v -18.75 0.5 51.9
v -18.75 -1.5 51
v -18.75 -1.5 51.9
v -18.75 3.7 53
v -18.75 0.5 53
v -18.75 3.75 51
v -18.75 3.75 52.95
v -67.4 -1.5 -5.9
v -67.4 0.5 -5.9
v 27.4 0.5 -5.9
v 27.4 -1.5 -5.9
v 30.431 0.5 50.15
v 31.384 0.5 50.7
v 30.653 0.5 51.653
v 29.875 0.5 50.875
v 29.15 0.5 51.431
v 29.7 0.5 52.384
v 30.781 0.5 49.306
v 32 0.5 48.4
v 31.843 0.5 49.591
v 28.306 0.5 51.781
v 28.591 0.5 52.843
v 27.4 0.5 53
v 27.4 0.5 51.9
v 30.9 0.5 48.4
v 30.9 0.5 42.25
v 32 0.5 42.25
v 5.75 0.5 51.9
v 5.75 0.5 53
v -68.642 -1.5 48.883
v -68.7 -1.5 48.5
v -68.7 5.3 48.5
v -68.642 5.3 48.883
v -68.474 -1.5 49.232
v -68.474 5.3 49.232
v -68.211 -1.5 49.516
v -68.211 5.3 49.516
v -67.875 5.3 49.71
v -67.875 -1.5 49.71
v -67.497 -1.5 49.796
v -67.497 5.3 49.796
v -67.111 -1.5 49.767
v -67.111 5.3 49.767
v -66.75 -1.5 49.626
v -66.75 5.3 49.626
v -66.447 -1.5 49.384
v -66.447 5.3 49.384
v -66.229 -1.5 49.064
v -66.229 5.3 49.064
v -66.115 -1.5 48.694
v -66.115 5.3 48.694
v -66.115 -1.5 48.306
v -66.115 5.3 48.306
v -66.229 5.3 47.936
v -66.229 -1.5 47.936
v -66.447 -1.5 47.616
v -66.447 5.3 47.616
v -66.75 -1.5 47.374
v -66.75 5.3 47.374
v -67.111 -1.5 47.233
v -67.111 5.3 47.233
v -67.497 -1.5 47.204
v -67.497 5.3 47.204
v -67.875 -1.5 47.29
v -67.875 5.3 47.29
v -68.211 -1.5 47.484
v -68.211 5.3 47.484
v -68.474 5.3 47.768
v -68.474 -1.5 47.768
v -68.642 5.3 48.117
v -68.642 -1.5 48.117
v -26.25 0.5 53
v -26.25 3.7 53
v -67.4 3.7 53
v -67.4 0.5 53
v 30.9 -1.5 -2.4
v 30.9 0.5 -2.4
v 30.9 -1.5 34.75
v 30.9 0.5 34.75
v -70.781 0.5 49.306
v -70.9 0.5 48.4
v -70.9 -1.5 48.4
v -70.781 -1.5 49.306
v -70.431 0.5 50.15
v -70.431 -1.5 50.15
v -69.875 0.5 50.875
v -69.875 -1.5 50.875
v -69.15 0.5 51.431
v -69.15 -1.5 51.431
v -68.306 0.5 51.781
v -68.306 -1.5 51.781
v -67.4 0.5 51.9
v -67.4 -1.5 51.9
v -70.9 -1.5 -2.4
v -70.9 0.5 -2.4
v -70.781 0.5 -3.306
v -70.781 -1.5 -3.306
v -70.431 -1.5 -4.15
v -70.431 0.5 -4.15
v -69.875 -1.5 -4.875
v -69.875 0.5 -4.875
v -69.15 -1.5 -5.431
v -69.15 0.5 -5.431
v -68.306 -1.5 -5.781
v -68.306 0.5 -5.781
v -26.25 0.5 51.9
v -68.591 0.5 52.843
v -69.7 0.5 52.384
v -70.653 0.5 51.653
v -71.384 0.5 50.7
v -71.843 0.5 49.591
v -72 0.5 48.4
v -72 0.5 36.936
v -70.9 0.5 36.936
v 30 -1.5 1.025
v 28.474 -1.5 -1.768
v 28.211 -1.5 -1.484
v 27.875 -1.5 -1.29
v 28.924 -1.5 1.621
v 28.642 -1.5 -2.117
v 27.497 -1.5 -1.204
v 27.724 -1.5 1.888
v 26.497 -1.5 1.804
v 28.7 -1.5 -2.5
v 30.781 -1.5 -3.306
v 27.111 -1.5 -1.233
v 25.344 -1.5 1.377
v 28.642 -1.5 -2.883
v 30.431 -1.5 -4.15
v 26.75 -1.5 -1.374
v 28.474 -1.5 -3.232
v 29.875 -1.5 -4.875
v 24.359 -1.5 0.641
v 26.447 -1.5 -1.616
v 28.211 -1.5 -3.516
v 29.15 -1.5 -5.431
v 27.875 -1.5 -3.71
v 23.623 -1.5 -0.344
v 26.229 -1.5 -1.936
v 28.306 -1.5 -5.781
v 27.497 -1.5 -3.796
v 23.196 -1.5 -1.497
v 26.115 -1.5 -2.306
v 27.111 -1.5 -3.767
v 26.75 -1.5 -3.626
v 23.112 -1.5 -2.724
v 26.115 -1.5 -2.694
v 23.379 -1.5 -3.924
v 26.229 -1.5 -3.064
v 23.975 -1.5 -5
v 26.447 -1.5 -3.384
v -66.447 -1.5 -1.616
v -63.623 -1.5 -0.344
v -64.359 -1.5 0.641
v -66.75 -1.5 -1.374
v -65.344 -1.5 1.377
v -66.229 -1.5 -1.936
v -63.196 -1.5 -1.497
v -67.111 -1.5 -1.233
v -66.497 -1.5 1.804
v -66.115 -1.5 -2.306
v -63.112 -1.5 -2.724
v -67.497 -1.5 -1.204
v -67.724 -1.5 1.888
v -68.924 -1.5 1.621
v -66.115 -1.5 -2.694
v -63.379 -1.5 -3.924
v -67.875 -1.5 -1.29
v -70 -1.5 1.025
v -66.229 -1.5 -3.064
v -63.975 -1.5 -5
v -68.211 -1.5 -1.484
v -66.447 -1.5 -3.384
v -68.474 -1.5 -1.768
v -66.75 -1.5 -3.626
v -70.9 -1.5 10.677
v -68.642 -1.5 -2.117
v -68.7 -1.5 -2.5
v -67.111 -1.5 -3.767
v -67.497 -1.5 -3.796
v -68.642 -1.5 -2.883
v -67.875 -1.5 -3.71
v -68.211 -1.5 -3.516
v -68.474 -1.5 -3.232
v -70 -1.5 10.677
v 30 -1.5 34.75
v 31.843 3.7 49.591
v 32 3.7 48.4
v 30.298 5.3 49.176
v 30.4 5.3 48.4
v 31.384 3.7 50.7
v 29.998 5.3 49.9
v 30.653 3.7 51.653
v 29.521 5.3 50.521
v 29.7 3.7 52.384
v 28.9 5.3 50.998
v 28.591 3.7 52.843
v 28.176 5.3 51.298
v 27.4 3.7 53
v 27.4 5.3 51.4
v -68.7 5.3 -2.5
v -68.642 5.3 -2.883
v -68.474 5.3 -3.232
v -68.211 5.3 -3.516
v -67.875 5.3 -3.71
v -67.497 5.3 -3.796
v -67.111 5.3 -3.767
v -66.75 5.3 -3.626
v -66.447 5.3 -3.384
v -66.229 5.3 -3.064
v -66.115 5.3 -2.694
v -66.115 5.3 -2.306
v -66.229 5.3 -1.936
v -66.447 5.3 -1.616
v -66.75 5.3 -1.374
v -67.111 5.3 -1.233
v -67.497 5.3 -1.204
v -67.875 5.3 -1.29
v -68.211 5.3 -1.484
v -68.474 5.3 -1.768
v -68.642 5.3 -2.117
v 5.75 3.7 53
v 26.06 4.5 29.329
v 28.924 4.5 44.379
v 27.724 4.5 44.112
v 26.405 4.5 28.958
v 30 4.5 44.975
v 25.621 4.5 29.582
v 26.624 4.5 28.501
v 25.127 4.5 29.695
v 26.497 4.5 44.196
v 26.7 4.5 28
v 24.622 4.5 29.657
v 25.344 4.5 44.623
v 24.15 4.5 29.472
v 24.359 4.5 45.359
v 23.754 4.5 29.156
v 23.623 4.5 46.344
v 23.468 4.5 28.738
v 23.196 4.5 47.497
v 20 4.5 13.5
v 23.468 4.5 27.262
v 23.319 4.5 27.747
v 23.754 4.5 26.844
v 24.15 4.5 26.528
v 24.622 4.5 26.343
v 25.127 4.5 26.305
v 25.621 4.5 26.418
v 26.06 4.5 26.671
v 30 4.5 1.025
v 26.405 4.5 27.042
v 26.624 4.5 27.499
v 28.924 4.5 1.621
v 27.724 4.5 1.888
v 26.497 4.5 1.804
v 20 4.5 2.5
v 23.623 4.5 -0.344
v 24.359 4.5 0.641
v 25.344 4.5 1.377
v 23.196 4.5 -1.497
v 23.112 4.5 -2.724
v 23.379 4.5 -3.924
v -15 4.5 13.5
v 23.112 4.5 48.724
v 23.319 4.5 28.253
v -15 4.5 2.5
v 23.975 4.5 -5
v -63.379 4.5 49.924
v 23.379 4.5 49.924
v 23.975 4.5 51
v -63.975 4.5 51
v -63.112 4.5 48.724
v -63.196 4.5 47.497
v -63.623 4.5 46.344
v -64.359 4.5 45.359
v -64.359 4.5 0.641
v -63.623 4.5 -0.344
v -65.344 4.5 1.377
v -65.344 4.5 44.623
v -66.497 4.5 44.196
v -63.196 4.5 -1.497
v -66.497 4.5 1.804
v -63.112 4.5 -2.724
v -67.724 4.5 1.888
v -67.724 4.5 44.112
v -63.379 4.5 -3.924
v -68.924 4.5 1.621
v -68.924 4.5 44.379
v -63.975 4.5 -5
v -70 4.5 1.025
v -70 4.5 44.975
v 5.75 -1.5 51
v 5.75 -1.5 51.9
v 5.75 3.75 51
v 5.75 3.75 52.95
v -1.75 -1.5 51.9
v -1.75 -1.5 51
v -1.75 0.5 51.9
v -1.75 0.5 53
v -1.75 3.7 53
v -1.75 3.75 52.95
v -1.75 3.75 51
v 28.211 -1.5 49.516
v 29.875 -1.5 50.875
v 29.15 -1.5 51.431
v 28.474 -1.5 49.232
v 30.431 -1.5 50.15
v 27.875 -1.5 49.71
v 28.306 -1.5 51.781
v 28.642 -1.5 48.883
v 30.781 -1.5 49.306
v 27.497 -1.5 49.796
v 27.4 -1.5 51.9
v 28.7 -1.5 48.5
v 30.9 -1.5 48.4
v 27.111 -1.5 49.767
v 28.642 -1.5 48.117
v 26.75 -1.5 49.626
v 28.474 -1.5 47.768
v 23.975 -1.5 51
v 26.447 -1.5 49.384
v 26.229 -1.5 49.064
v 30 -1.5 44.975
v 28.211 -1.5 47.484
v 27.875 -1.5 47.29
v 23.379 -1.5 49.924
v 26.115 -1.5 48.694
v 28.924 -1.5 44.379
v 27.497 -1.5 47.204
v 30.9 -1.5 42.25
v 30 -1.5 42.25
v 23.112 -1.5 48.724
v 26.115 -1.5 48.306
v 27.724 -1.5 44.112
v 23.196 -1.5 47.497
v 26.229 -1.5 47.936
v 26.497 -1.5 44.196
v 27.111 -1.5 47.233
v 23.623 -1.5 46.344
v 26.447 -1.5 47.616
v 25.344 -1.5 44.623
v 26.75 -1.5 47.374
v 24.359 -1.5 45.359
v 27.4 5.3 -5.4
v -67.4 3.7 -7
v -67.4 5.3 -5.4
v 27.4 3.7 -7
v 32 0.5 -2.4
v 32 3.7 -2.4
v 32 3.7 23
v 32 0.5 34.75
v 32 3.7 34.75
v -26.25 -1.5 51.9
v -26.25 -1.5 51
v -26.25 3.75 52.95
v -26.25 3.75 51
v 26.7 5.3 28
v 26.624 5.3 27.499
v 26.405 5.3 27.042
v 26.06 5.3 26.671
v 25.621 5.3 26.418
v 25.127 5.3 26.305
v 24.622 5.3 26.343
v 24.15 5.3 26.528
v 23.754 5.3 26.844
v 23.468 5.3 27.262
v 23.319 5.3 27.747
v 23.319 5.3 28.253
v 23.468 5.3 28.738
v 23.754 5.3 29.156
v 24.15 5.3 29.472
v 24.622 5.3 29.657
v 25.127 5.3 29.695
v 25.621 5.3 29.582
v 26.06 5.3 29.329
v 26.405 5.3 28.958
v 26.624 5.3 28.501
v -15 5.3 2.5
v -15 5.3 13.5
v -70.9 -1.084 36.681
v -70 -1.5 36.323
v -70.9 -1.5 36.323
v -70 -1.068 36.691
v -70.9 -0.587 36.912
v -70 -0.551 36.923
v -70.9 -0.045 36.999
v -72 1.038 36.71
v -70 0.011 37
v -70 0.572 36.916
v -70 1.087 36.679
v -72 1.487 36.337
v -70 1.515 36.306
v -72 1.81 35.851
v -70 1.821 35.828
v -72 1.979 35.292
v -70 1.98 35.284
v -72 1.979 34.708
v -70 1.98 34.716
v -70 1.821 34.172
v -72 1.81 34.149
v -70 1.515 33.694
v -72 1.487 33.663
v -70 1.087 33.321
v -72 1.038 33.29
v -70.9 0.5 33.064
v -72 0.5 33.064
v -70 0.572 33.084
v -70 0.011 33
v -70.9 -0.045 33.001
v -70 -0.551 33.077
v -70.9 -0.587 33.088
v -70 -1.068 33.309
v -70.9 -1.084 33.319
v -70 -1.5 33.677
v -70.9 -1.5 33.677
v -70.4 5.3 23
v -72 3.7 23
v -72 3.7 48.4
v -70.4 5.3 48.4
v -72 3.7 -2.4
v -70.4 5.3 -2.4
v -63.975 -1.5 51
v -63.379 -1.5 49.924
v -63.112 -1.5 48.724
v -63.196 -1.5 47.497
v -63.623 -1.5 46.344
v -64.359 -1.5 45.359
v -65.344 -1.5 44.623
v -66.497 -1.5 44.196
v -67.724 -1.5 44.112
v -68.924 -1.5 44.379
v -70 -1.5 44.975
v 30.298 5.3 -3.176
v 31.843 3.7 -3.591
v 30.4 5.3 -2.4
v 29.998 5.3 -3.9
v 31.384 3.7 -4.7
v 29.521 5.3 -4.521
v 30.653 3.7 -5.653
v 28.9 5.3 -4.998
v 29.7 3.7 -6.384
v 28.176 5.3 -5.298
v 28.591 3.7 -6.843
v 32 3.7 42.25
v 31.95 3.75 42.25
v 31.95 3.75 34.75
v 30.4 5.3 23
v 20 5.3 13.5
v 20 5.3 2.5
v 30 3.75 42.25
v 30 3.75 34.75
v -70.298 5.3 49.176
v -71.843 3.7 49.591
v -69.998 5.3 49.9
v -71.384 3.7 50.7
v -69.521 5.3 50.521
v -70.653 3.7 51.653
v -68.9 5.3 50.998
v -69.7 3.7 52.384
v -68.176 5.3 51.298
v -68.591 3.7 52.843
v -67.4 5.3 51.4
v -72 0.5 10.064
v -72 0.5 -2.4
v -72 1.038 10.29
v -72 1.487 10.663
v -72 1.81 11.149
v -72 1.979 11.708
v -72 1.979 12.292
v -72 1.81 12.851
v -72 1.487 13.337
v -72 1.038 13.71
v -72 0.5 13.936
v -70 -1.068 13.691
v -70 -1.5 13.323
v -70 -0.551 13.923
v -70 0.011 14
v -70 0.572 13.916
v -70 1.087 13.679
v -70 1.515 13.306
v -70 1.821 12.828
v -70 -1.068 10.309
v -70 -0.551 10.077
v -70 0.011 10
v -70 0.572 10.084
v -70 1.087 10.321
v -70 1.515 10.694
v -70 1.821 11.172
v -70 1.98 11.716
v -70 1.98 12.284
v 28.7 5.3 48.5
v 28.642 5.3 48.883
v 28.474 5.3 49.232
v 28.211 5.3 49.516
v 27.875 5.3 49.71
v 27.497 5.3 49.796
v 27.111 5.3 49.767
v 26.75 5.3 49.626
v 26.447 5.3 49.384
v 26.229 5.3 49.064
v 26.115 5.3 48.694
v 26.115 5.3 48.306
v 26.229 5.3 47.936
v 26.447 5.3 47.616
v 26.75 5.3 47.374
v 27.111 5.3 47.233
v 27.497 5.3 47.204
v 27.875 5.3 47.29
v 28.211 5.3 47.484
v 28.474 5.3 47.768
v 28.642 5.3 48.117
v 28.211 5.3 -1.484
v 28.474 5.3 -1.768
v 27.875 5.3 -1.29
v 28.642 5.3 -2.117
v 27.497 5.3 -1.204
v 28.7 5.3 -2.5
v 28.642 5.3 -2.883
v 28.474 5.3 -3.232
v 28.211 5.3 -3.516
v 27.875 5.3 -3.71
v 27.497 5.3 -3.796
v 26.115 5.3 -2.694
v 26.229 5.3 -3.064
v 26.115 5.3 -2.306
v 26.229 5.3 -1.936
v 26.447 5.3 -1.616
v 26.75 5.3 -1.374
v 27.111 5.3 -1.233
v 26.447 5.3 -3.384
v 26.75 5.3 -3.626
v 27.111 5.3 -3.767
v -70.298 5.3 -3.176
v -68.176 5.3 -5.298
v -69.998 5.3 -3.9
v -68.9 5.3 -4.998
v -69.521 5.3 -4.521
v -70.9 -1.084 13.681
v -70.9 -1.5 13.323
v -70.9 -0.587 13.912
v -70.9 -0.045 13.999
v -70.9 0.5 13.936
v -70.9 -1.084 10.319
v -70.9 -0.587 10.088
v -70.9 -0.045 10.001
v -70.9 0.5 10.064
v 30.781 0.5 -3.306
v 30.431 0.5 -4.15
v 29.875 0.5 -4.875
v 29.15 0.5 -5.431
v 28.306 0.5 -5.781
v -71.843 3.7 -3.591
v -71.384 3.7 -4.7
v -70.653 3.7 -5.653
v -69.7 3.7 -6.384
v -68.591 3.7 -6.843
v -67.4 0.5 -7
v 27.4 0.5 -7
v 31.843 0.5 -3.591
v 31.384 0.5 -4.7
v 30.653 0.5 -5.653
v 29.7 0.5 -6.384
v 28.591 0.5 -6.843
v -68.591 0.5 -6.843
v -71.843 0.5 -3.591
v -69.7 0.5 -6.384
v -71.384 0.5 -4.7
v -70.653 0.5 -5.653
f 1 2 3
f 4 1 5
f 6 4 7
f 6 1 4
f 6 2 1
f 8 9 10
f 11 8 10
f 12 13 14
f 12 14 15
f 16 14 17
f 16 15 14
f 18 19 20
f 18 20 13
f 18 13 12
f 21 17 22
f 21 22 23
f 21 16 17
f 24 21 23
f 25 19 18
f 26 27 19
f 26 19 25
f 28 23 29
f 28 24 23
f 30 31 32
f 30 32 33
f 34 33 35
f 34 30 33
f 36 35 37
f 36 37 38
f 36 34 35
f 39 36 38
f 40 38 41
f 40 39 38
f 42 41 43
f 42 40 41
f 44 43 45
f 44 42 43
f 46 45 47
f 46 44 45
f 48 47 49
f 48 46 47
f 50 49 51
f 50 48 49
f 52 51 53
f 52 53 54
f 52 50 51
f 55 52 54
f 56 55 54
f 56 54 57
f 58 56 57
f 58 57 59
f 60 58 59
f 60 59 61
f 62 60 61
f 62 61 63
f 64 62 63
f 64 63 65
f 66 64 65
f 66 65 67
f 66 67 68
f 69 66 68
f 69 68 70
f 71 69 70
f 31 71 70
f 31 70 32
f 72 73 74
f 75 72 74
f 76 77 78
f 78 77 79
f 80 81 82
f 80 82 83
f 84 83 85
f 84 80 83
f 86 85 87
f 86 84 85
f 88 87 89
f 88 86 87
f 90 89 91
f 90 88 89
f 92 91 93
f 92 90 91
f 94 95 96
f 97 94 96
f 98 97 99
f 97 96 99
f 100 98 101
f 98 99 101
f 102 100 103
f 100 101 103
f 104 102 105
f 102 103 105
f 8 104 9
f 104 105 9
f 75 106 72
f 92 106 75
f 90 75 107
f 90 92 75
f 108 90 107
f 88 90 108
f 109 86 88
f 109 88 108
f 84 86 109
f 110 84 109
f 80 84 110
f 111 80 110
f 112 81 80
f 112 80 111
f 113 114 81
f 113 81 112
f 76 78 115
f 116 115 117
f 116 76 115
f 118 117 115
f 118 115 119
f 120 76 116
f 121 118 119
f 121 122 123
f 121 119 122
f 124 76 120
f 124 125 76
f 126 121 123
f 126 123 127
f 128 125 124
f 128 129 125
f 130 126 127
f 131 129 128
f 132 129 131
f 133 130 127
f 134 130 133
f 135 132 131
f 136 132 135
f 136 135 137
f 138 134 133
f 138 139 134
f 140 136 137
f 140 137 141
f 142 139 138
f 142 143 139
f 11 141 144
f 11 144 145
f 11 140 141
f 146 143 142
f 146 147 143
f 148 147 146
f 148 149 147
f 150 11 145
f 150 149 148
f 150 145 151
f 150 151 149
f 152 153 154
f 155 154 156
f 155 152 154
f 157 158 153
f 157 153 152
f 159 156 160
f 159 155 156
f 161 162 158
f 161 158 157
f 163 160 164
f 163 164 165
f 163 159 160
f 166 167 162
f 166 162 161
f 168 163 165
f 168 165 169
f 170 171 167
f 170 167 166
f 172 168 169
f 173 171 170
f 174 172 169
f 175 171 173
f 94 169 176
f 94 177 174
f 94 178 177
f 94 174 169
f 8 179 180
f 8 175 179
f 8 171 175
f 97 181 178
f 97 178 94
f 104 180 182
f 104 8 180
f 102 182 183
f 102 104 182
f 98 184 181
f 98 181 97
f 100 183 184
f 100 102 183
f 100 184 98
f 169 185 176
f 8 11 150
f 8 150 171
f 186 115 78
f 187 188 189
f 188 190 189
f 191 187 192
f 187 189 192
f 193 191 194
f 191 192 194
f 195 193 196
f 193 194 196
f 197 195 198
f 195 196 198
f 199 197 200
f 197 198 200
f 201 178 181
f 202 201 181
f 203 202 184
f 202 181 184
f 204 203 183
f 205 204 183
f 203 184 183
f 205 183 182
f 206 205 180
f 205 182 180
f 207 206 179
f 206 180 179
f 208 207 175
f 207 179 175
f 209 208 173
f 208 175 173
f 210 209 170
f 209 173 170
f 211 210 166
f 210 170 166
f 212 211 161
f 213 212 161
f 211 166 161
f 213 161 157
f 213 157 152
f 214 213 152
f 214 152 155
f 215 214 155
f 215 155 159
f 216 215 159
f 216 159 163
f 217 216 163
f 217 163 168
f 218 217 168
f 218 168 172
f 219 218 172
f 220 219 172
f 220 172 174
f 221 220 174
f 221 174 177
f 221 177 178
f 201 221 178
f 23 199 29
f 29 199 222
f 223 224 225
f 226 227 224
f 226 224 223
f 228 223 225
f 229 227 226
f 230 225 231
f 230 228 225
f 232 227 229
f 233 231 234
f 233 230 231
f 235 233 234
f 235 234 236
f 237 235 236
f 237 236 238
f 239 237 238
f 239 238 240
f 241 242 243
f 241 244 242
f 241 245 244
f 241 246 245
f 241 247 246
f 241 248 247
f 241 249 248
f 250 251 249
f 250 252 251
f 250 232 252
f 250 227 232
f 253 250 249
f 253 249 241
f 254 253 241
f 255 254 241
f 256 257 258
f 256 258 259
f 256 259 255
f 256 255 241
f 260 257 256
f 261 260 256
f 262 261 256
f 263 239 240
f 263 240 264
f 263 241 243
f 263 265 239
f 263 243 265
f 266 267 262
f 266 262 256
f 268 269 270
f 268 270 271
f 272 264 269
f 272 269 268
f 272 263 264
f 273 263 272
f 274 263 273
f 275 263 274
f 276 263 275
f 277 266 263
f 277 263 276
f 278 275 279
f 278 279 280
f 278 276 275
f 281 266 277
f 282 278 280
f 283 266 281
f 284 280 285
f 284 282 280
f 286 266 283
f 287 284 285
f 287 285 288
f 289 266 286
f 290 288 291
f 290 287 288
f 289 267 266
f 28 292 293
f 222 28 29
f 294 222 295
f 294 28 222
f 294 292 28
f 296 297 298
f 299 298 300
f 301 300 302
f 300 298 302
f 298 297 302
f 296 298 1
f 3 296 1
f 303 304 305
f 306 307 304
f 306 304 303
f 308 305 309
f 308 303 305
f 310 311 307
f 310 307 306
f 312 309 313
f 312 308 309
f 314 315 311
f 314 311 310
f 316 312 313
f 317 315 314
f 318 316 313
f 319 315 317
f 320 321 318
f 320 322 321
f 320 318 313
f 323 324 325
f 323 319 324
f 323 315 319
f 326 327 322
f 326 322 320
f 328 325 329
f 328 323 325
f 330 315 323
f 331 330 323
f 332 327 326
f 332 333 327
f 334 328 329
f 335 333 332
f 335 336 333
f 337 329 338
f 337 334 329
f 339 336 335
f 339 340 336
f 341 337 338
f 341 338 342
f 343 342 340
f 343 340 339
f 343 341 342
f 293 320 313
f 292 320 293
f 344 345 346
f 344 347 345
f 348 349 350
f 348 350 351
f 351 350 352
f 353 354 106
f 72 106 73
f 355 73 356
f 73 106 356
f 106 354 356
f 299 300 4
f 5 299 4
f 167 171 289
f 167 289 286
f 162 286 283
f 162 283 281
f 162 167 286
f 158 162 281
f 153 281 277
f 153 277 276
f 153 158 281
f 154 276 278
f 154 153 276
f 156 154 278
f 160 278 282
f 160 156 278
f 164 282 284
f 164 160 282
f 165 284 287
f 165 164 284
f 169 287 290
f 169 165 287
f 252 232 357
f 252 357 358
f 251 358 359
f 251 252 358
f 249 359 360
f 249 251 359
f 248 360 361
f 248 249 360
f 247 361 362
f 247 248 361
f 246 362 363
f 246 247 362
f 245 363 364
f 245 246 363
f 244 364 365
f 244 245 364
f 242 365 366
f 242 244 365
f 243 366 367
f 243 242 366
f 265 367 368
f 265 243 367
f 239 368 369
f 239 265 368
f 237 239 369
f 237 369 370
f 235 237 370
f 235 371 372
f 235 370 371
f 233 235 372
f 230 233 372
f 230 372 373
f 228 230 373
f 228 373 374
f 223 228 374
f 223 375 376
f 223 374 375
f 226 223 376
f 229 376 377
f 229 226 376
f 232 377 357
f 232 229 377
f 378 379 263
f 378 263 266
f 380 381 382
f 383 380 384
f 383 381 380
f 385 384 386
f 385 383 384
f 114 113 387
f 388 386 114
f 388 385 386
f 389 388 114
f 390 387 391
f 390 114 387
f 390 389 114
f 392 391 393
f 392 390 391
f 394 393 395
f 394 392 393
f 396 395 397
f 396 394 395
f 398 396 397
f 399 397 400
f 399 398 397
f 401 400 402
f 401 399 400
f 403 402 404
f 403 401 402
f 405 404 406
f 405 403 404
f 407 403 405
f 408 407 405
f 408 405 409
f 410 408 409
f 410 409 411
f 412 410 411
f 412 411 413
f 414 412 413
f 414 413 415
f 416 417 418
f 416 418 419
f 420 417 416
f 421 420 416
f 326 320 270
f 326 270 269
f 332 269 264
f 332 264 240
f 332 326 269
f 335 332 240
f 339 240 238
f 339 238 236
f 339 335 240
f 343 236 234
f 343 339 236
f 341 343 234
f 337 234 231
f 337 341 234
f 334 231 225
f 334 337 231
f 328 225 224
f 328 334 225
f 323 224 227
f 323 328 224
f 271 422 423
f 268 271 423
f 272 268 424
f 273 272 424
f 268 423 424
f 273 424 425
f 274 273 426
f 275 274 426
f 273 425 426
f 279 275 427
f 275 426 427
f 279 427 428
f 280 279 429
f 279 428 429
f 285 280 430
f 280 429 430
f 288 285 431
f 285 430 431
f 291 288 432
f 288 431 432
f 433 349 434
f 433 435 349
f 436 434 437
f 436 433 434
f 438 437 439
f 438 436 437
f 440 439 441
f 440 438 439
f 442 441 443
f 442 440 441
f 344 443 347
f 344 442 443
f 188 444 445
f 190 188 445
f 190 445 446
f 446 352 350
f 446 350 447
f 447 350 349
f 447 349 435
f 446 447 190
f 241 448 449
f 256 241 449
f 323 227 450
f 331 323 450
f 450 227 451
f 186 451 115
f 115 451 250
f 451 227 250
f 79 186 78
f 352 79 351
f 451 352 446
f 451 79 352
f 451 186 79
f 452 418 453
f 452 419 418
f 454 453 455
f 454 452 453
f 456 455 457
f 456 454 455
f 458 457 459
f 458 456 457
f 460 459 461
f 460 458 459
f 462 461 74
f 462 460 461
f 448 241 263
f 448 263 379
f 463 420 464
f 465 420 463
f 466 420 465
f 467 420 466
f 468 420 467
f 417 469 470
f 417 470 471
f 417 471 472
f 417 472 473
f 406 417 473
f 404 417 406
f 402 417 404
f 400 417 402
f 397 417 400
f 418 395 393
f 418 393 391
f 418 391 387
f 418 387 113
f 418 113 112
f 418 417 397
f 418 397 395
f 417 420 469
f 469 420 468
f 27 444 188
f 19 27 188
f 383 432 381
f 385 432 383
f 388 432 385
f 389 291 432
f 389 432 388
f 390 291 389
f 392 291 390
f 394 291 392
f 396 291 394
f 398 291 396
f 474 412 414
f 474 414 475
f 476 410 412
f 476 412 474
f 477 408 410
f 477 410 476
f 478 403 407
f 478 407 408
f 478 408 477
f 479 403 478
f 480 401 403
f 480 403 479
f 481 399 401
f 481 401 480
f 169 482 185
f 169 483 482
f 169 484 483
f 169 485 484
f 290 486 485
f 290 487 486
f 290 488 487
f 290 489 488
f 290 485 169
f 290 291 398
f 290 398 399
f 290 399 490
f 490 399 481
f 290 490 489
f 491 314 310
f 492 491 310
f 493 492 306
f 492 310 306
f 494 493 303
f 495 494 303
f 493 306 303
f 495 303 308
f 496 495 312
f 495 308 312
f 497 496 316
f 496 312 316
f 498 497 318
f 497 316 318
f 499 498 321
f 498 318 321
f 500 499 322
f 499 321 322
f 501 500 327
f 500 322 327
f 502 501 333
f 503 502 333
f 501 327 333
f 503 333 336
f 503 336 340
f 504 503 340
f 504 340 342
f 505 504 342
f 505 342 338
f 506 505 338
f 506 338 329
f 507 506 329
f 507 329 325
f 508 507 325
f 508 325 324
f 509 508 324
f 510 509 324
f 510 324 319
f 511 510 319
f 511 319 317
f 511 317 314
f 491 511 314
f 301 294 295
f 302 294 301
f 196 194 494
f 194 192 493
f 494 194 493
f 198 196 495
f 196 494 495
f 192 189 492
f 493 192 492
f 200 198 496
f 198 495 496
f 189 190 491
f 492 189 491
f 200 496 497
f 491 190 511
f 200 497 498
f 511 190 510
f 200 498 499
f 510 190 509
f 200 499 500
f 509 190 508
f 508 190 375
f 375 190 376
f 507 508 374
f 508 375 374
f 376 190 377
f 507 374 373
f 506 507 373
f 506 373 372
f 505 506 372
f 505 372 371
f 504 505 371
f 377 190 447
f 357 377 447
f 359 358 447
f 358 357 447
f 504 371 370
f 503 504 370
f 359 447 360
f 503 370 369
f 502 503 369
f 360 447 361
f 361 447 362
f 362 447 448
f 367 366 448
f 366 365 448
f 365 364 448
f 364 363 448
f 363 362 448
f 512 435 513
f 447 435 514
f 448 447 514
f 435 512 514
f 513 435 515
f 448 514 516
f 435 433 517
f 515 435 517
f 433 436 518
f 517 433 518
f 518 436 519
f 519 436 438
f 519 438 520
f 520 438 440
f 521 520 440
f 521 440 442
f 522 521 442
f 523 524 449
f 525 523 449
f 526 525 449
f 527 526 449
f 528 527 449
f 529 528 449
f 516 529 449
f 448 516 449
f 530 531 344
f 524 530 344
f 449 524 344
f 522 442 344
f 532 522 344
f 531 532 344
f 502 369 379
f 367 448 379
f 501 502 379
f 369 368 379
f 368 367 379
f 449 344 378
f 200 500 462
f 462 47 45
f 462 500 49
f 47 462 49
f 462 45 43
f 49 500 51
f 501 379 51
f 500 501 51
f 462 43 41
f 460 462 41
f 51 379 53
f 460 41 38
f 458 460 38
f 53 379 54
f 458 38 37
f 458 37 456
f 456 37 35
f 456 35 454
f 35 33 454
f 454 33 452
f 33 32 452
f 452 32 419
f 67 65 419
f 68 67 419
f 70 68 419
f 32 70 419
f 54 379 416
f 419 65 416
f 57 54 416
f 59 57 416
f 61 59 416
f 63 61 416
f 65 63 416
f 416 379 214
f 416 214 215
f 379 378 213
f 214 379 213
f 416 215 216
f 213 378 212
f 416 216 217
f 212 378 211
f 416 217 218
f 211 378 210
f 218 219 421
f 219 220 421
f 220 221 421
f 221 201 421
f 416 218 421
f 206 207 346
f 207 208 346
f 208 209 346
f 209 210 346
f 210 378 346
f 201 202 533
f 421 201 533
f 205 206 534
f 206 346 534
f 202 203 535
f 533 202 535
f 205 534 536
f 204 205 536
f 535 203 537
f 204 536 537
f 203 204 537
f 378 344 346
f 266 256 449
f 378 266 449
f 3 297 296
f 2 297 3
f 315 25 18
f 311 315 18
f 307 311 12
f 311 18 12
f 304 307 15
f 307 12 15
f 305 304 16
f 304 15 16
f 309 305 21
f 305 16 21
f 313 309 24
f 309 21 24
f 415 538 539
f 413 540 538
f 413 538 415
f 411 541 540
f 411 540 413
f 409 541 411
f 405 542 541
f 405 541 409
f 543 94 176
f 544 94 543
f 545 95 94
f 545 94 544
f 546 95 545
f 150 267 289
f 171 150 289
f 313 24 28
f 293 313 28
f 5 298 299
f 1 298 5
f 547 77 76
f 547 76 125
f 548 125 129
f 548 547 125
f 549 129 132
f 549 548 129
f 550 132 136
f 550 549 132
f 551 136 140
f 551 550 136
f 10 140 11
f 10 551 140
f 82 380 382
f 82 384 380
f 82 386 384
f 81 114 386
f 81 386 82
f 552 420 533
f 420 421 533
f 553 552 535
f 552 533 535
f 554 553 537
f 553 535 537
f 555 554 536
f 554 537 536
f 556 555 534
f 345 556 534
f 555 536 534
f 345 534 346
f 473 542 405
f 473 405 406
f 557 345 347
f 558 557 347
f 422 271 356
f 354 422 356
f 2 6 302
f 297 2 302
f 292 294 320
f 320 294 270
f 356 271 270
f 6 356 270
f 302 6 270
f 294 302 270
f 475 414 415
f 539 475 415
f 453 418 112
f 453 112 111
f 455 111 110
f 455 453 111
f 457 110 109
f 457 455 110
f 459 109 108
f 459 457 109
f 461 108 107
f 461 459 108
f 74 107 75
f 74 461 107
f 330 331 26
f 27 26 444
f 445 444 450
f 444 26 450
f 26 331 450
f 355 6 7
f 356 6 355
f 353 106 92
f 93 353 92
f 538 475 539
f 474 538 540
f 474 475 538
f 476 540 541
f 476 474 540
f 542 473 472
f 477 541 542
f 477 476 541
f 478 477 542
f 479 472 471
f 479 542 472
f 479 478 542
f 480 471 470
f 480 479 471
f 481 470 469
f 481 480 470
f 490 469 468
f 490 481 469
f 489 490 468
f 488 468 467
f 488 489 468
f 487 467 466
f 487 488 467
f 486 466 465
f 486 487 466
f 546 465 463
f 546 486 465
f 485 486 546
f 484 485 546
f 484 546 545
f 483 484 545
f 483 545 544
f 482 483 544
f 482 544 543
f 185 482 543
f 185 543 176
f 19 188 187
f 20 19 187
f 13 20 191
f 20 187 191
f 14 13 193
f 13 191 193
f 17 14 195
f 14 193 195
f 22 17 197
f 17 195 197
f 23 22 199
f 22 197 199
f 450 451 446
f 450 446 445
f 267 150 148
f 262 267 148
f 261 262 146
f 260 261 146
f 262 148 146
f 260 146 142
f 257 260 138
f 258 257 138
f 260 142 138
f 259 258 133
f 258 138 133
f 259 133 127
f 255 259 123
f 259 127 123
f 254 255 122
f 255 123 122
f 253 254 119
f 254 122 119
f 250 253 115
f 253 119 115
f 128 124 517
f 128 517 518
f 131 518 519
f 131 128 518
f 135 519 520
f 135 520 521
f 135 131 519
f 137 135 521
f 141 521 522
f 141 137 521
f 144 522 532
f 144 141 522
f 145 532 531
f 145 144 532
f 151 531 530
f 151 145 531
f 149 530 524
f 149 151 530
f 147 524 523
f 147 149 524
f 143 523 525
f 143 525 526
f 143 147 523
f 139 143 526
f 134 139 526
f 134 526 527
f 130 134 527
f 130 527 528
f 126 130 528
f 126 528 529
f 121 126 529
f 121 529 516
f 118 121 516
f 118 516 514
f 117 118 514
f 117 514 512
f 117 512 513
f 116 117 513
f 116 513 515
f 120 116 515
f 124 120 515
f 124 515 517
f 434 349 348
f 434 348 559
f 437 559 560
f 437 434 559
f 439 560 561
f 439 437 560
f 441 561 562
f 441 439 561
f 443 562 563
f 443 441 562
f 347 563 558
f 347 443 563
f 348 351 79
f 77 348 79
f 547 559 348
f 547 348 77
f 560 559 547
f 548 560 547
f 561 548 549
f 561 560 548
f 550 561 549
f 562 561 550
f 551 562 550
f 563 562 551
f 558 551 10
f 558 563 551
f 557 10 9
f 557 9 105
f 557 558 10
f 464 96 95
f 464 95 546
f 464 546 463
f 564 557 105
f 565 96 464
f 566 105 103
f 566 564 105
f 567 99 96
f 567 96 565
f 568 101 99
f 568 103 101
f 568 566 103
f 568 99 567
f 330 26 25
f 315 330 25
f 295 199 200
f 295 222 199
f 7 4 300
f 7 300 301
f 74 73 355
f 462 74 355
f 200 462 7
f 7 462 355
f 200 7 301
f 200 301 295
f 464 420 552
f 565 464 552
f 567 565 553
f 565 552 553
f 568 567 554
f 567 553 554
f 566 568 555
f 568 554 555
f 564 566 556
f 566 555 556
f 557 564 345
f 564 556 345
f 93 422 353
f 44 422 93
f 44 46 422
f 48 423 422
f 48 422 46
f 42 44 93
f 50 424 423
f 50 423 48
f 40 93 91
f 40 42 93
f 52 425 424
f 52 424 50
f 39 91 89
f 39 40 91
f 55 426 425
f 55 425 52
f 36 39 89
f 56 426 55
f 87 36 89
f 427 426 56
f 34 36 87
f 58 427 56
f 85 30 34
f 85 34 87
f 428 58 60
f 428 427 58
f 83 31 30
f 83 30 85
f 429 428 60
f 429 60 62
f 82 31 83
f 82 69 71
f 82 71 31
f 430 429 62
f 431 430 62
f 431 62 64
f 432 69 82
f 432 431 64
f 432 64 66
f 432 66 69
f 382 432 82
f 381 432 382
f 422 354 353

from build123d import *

# Parameters (mm, degrees)
CYLINDER001_R           = 2
CYLINDER001_DEPTH       = 10
SKETCH037_W             = 7.5
SKETCH037_H             = 7.5
EXTRUDE045_DEPTH        = 10
BOX089_W                = 11
BOX089_H                = 10
BOX089_DEPTH            = 35
BODY005_PLACEMENT_ANGLE = 90
BODY006_PLACEMENT_ANGLE = 90
CYLINDER003_R           = 2
CYLINDER003_DEPTH       = 10
CYLINDER002_R           = 1.7
CYLINDER002_DEPTH       = 10
SKETCH005_R             = 1.3
EXTRUDE003_DEPTH        = 20
EXTRUDE039_DEPTH        = 4
EXTRUDE042_DEPTH        = 0.8
EXTRUDE002_DEPTH        = 6
EXTRUDE037_DEPTH        = 2


with BuildPart() as battery_cable:
    # Cylinder001 → Cylinder001 (new body)
    with BuildSketch(Plane(origin=(-66.5, 0, 35), x_dir=(0, 0, 1), z_dir=(-1, 0, 0))):
        Circle(CYLINDER001_R)
    extrude(amount=CYLINDER001_DEPTH)


with BuildPart() as switch_hole002:
    # Sketch037 → Extrude045 (new body)
    with BuildSketch(Plane.YZ.offset(35)):
        with Locations((0, 38.5)):
            Rectangle(SKETCH037_W, SKETCH037_H)
    extrude(amount=EXTRUDE045_DEPTH)


with BuildPart() as switch_hole002_1:
    # Extrude045 placement: moved
    add(switch_hole002.part.moved(Location((-9.5, 0, 0))))


with BuildPart() as dips001:
    # Box089 → Box089 (new body)
    with BuildSketch(Plane(origin=(-15, 0.5, 13.5), x_dir=(0, 0, -1), z_dir=(1, 0, 0))):
        with Locations((5.5, 5)):
            Rectangle(BOX089_W, BOX089_H)
    extrude(amount=BOX089_DEPTH)


with BuildPart() as switch_hole001:
    # Body005 base: copy of switch hole002
    add(switch_hole002_1.part)


with BuildPart() as switch_hole001_1:
    # Body005 placement: moved
    add(switch_hole001.part.moved(Location((40.5, 0, 22))).rotate(Axis((40.5, 0, 22), (0, -1, 0)), BODY005_PLACEMENT_ANGLE))


with BuildPart() as switch_hole:
    # Body006 base: copy of switch hole002
    add(switch_hole002_1.part)


with BuildPart() as switch_hole_1:
    # Body006 placement: moved
    add(switch_hole.part.moved(Location((16, 0, 22))).rotate(Axis((16, 0, 22), (0, -1, 0)), BODY006_PLACEMENT_ANGLE))


with BuildPart() as cable:
    # Cylinder003 → Cylinder003 (new body)
    with BuildSketch(Plane(origin=(-65.5, 0, 12), x_dir=(0, -1, 0), z_dir=(-1, 0, 0))):
        Circle(CYLINDER003_R)
    extrude(amount=CYLINDER003_DEPTH)


with BuildPart() as common_sub:
    # Cylinder002 → Cylinder002 (new body)
    with BuildSketch(Plane(origin=(25, -1.5, 28), x_dir=(1, 0, 0), z_dir=(0, 1, 0))):
        Circle(CYLINDER002_R)
    extrude(amount=CYLINDER002_DEPTH)

    # Fusion033: union battery cable, switch hole002, dips001, switch hole001, switch hole, cable
    add(battery_cable.part)
    add(switch_hole002_1.part)
    add(dips001.part)
    add(switch_hole001_1.part)
    add(switch_hole_1.part)
    add(cable.part)


with BuildPart() as sweep001:
    # Sweep001: sweep along a path in Sketch034
    with BuildLine(Plane.XZ.offset(10)) as sweep001_path:
        Line((32, 12), (32, 48.4))
        ThreePointArc((32, 48.4), (30.652691, 51.652691), (27.4, 53))
        Line((27.4, 53), (-20, 53))
    # Sketch035 → Sweep001 (sweep)
    with BuildSketch(Plane.YZ):
        Polygon((5.3, 51.4), (3.7, 53), (3.7, 54), (6, 54), (6, 51.4), align=None)
    sweep(path=sweep001_path.line)


with BuildPart() as fusion030:
    # Sketch005 → Extrude003 (new body)
    with BuildSketch(Plane.XZ.offset(5)):
        with Locations((27.4, 48.5)):
            Circle(SKETCH005_R)
    extrude(amount=-EXTRUDE003_DEPTH)


with BuildPart() as fusion030_1:
    # Extrude003 placement: moved
    add(fusion030.part.moved(Location((0, -4, 0))))

    # Fusion030: union Sweep001
    add(sweep001.part)


with BuildPart() as top003:
    # Sketch028 → Extrude039 (new body)
    with BuildSketch(Plane.XZ.offset(10)):
        with BuildLine():
            ThreePointArc((32, 48.4), (30.652691, 51.652691), (27.4, 53))
            Line((27.4, 53), (-20, 53))
            Line((-20, 53), (-20, 51))
            Line((-20, 51), (27.4, 51))
            ThreePointArc((30, 48.4), (29.238478, 50.238478), (27.4, 51))
            Line((30, 23), (30, 48.4))
            Line((32, 23), (30, 23))
            Line((32, 48.4), (32, 23))
        make_face()
    extrude(amount=EXTRUDE039_DEPTH)


with BuildPart() as top003_1:
    # Extrude039 placement: moved
    add(top003.part.moved(Location((0, 14.5, 0))))


with BuildPart() as top002:
    # Sketch031 → Extrude042 (new body)
    with BuildSketch(Plane.XZ.offset(10)):
        with BuildLine():
            ThreePointArc((32, 48.4), (30.652691, 51.652691), (27.4, 53))
            Line((27.4, 53), (-20, 53))
            Line((-20, 53), (-20, 23))
            Line((-20, 23), (32, 23))
            Line((32, 48.4), (32, 23))
        make_face()
    extrude(amount=EXTRUDE042_DEPTH)


with BuildPart() as top002_1:
    # Extrude042 placement: moved
    add(top002.part.moved(Location((0, 15.3, 0))))


with BuildPart() as screw_hole_top:
    # Sketch004 → Extrude002 (new body)
    with BuildSketch(Plane.XZ.offset(10)):
        with BuildLine():
            ThreePointArc((23.975091, 51), (24.359441, 45.359441), (30, 44.975091))
            Line((30, 44.975091), (30, 48.4))
            ThreePointArc((30, 48.4), (29.238478, 50.238478), (27.4, 51))
            Line((23.975091, 51), (27.4, 51))
        make_face()
    extrude(amount=-EXTRUDE002_DEPTH)


with BuildPart() as screw_hole_top_1:
    # Extrude002 placement: moved
    add(screw_hole_top.part.moved(Location((0, 8.5, 0))))


with BuildPart() as top:
    # Sketch029 → Extrude037 (new body)
    with BuildSketch(Plane.XZ.offset(10)):
        with BuildLine():
            ThreePointArc((30.9, 48.4), (29.874874, 50.874874), (27.4, 51.9))
            Line((27.4, 51.9), (-20, 51.9))
            Line((-20, 51.9), (-20, 51))
            Line((-20, 51), (27.4, 51))
            ThreePointArc((30, 48.4), (29.238478, 50.238478), (27.4, 51))
            Line((30, 23), (30, 48.4))
            Line((30.9, 23), (30, 23))
            Line((30.9, 48.4), (30.9, 23))
        make_face()
    extrude(amount=EXTRUDE037_DEPTH)


with BuildPart() as top_1:
    # Extrude037 placement: moved
    add(top.part.moved(Location((0, 10.5, 0))))

    # Fusion028: union top003, top002, screw hole top
    add(top003_1.part)
    add(top002_1.part)
    add(screw_hole_top_1.part)

    # Cut024: cut Fusion030
    add(fusion030_1.part, mode=Mode.SUBTRACT)


with BuildPart() as part_mirroring:
    # Part__Mirroring: instance of top
    add(top_1.part.mirror(Plane(origin=(0, 0, 23), x_dir=(0, 1, 0), z_dir=(0, 0, 1))))


with BuildPart() as part_mirroring002:
    # Part__Mirroring002: instance of Part__Mirroring
    add(part_mirroring.part.mirror(Plane(origin=(-20, 1, 0), x_dir=(0, -1, 0), z_dir=(1, 0, 0))))


with BuildPart() as top007:
    # Part__Mirroring003: instance of top
    add(top_1.part.mirror(Plane(origin=(-20, 0, 0), x_dir=(0, -1, 0), z_dir=(1, 0, 0))))

    # Fusion032: union top, Part__Mirroring, Part__Mirroring002
    add(top_1.part)
    add(part_mirroring.part)
    add(part_mirroring002.part)

    # Cut025: cut common sub
    add(common_sub.part, mode=Mode.SUBTRACT)


solid = top007.part
